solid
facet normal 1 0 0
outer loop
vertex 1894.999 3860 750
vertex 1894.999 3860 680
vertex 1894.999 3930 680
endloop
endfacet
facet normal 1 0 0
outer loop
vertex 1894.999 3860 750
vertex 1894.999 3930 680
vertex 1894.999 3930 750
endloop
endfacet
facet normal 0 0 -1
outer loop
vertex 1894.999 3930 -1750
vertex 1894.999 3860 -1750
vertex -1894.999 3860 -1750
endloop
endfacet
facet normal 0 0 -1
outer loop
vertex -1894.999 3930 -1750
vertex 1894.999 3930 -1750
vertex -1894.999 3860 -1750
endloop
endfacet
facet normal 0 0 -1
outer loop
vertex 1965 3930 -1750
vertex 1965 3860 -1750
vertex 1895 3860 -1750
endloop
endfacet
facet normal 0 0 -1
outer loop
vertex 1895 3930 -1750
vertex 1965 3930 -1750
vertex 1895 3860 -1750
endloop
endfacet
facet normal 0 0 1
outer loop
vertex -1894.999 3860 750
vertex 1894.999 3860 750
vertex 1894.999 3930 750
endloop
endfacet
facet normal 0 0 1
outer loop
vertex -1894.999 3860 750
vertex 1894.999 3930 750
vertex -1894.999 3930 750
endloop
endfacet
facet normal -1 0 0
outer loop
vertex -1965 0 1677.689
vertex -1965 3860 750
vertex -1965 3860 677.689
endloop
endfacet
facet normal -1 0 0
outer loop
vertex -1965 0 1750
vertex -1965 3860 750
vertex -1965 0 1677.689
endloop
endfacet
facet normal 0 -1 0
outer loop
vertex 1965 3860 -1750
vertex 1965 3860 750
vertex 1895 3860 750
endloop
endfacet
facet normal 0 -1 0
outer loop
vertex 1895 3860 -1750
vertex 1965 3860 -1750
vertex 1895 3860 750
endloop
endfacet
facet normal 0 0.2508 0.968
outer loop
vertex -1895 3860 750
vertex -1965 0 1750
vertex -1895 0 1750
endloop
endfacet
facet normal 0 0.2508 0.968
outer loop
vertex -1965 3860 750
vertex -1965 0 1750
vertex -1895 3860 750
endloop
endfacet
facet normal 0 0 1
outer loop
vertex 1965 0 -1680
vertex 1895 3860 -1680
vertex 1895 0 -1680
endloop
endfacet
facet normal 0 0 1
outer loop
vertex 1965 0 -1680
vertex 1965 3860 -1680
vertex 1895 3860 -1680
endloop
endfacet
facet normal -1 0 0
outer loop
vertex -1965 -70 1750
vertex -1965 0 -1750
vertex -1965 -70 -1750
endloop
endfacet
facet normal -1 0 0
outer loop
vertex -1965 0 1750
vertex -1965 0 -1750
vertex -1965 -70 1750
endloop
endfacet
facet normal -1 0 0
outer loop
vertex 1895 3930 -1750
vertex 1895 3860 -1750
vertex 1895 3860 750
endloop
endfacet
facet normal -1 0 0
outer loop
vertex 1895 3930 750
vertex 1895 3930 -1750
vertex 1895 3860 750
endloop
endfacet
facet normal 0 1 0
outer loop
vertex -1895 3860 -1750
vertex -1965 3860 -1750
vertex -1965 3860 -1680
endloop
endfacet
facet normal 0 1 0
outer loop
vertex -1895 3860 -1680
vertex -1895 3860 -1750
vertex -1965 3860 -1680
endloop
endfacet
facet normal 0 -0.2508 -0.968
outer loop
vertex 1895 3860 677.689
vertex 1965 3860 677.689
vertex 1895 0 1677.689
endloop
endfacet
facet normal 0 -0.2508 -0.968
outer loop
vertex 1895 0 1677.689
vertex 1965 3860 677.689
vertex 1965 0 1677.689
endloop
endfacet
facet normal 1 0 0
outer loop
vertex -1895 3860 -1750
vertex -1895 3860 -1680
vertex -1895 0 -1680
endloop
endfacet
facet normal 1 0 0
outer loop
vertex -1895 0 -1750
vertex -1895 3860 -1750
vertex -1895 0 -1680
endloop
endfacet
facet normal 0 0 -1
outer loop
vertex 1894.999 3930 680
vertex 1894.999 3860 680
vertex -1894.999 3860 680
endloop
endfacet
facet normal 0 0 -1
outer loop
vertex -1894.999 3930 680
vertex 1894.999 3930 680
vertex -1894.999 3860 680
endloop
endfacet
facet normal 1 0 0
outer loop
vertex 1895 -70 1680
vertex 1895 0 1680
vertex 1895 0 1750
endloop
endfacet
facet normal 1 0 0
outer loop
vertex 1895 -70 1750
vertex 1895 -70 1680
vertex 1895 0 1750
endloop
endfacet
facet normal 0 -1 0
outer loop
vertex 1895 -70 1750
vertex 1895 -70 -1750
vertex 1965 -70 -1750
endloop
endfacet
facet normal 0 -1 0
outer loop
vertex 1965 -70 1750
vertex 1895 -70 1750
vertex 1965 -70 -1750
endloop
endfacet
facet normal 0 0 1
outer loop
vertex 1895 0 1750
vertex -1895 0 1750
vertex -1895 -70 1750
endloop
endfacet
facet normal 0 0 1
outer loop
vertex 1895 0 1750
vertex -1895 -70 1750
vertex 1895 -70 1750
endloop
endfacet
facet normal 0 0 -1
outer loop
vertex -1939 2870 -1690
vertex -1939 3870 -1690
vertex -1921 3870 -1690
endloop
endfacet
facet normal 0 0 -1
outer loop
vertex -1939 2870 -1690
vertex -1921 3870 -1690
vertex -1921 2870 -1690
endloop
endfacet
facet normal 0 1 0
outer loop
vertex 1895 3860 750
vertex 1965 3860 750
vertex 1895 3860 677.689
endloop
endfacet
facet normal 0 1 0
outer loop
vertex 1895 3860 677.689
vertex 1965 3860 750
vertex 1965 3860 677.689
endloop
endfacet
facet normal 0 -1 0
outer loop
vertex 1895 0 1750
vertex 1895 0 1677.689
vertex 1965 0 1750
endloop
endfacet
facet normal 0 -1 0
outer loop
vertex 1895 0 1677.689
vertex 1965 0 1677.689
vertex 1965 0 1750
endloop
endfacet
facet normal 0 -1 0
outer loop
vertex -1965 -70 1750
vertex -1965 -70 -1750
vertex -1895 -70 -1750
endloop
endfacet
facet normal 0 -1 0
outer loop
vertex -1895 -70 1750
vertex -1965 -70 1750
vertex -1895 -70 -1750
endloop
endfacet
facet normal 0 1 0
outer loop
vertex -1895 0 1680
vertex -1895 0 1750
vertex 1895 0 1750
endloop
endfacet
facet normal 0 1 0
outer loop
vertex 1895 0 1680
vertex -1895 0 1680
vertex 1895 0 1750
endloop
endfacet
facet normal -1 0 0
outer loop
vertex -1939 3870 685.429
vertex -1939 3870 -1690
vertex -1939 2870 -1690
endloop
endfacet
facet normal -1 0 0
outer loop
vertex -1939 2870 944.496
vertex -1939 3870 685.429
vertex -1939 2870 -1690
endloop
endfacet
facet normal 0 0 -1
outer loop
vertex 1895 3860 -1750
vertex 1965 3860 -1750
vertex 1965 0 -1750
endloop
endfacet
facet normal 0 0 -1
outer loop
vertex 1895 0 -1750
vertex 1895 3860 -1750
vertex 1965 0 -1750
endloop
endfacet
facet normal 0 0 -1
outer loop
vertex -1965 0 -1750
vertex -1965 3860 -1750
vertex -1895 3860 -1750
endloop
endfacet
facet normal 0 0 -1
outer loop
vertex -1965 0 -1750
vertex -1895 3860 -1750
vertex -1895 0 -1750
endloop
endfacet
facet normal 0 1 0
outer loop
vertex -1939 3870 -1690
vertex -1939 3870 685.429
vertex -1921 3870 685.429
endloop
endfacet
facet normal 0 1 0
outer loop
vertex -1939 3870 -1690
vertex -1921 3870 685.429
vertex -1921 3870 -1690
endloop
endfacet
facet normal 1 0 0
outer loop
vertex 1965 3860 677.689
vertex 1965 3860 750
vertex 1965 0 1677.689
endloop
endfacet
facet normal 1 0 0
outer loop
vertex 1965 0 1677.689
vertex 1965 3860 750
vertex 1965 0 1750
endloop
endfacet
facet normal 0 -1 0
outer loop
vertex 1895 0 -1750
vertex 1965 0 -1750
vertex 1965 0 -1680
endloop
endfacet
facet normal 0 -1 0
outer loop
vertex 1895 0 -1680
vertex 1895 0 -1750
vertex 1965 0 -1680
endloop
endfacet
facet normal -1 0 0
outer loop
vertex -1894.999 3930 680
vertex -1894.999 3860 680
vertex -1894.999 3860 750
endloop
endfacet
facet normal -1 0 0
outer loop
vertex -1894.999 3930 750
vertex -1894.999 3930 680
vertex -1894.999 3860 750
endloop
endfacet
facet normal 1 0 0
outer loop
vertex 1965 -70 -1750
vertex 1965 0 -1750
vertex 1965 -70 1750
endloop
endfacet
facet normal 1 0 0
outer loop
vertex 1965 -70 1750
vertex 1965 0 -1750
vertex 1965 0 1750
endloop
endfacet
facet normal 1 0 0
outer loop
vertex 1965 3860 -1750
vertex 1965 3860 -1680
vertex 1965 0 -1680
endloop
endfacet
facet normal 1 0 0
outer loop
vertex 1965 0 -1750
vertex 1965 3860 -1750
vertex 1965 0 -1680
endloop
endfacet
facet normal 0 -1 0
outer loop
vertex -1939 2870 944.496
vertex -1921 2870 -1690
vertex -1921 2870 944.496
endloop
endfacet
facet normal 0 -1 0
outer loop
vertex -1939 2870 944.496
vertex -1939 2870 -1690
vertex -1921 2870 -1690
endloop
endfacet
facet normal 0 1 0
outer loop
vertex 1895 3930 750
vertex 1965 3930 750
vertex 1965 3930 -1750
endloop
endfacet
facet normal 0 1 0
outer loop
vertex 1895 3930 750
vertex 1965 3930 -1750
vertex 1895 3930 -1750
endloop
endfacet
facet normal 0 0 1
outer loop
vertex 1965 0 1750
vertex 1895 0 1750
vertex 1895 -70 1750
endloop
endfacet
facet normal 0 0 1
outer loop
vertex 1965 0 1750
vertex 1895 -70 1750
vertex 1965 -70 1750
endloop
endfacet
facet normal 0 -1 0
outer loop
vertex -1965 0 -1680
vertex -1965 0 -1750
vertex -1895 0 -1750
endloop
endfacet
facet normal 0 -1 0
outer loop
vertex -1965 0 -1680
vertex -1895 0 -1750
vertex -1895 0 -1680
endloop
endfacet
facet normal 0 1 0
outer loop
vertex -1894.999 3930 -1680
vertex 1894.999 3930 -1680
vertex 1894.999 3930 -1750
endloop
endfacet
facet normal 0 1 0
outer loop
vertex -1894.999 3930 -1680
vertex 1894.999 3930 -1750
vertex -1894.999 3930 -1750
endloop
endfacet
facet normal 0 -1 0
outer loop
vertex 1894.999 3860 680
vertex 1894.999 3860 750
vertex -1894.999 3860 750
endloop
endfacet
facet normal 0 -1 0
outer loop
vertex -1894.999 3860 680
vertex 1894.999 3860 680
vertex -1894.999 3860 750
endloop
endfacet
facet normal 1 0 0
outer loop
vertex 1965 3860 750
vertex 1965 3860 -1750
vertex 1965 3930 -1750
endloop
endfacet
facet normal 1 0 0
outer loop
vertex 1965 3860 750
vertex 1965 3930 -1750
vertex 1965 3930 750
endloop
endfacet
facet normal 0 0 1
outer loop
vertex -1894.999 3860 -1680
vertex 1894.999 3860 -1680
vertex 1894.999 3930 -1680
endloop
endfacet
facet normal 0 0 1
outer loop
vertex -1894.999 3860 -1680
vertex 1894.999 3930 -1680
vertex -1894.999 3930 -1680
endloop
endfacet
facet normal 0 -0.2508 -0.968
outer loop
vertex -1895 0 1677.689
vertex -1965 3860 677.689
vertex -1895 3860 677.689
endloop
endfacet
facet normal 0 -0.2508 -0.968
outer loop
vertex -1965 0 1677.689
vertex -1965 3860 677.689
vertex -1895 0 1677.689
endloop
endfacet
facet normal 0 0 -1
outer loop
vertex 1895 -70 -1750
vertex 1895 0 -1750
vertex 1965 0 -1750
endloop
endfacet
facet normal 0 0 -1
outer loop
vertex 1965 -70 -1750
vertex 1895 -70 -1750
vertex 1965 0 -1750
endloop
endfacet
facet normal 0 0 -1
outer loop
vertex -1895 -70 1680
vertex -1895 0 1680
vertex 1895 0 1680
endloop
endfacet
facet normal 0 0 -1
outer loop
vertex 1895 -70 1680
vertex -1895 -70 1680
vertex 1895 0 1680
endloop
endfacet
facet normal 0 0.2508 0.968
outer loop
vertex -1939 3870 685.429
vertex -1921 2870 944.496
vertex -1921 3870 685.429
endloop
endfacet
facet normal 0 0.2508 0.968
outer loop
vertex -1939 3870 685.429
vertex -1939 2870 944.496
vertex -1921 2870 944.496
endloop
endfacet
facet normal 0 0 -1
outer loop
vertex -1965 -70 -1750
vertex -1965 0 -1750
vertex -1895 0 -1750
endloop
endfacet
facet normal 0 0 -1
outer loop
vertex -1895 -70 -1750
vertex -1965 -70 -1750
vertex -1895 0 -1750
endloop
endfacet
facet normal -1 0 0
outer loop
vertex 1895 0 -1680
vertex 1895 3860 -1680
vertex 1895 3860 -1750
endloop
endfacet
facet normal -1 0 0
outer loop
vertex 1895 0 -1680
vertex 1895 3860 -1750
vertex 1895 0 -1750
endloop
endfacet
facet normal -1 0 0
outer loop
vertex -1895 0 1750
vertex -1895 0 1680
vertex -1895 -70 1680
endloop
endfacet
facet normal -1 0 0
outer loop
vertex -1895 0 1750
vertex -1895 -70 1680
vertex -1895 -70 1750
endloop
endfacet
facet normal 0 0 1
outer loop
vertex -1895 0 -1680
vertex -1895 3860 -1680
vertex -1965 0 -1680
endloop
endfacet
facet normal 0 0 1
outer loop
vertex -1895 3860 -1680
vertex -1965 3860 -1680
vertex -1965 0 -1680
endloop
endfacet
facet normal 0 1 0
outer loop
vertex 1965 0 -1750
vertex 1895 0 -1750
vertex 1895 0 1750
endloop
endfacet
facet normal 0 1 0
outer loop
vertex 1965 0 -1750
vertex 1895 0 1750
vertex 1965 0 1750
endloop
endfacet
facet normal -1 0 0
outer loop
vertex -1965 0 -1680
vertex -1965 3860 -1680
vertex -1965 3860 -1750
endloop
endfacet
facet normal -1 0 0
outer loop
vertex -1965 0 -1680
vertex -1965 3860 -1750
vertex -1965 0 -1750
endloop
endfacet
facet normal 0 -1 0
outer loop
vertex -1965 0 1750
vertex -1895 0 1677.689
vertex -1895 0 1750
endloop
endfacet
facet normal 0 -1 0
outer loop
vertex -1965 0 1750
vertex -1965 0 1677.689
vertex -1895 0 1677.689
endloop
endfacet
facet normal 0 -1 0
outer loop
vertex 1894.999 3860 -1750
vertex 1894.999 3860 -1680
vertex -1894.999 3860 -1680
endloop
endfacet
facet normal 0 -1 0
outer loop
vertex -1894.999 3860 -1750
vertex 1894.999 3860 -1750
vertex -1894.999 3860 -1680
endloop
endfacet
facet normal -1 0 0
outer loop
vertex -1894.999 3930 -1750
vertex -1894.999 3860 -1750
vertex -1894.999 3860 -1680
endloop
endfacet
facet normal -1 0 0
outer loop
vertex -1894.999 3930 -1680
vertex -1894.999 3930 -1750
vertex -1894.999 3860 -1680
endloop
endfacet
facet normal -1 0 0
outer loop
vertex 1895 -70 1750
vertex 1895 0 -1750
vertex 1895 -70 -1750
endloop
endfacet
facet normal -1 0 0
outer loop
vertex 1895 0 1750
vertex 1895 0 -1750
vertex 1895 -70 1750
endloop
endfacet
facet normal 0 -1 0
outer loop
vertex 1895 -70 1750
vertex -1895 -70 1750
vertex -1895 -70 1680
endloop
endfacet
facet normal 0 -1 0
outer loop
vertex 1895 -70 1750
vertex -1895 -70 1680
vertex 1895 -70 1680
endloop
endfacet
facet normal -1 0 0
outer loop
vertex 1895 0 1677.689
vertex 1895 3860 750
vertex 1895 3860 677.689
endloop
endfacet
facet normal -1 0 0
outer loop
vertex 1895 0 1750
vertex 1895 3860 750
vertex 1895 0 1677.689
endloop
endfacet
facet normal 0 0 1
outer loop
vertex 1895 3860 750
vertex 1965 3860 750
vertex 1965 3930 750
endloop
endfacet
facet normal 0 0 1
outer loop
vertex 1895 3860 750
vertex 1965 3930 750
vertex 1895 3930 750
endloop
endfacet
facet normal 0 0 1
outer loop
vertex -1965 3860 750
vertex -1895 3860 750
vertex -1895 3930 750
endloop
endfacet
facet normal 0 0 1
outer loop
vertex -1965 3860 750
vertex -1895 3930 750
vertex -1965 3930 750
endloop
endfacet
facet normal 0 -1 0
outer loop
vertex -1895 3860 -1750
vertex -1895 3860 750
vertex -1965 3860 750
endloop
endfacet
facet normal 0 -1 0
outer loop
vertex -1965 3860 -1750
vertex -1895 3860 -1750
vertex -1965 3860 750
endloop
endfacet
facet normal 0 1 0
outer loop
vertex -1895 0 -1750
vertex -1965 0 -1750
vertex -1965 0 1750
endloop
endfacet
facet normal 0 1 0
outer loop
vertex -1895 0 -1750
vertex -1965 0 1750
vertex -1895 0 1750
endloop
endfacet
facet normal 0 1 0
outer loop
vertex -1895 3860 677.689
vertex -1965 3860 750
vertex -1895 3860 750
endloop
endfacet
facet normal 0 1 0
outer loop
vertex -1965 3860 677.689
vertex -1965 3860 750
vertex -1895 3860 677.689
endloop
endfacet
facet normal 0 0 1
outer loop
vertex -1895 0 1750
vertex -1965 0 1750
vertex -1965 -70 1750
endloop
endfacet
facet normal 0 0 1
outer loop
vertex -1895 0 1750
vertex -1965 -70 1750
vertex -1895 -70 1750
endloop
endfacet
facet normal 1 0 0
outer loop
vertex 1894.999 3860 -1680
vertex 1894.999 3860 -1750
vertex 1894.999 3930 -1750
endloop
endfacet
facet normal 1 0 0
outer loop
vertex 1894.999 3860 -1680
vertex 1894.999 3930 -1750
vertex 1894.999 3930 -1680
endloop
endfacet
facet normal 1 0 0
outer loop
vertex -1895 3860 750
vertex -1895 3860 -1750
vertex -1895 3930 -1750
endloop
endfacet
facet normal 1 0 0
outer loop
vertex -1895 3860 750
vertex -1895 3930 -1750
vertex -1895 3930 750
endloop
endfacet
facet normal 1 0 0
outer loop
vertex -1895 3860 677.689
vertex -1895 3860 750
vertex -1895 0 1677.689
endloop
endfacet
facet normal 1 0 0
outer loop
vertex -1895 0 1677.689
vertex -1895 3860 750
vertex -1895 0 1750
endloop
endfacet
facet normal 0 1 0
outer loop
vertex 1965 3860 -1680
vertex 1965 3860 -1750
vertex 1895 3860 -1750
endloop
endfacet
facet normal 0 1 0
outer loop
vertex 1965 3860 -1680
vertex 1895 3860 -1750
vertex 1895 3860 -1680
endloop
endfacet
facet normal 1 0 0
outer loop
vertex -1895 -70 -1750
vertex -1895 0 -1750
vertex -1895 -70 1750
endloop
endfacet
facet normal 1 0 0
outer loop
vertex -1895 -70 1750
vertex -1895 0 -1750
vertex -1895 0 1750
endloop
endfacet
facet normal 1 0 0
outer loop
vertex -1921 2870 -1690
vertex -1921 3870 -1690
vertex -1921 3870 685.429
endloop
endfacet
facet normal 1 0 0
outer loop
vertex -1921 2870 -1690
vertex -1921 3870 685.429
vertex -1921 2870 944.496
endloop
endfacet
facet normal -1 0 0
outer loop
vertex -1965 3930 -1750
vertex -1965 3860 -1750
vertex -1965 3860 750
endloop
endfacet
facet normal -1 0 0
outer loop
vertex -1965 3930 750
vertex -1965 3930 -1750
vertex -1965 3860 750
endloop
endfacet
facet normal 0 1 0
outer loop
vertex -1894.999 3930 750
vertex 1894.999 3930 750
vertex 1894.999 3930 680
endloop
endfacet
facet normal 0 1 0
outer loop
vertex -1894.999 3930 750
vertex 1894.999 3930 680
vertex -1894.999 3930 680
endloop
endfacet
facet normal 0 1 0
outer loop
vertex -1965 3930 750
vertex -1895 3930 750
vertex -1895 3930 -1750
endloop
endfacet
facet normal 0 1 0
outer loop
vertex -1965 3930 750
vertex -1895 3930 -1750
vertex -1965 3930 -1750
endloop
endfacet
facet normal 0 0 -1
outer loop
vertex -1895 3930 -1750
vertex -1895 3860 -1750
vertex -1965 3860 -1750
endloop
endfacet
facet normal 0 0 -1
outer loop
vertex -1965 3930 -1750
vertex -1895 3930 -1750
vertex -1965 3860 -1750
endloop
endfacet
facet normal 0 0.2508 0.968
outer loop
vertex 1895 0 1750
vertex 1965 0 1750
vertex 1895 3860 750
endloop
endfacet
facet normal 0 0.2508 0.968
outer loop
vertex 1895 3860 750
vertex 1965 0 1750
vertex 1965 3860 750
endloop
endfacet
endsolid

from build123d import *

# Parameters (mm, degrees)
F2_W          = 70
F2_H          = 3500
F3_DEPTH      = 70
F4_W          = 3790
F4_H          = 70
F5_DEPTH      = 70
F9_DEPTH      = 35
F9_DEPTH_BACK = 35
F8_W          = 3860
F8_H          = 70
F11_W         = 70
F11_H         = 2500
F12_DEPTH     = 70
F11_W_2       = 3789.998
F11_H_2       = 70
F14_DEPTH     = 9


with BuildPart() as f3:
    # F2 (on Front) → F3 (new body)
    with BuildSketch(Plane.XZ):
        with Locations((-1930, 0)):
            Rectangle(F2_W, F2_H)
    extrude(amount=F3_DEPTH)


with BuildPart() as f3b:
    # F2 (on Front) → F3, piece 2 (new body)
    with BuildSketch(Plane.XZ):
        with Locations((1930, 0)):
            Rectangle(F2_W, F2_H)
    extrude(amount=F3_DEPTH)


with BuildPart() as f5:
    # F4 (on face) → F5 (new body)
    with BuildSketch(Plane.XZ):
        with Locations((0, 1715)):
            Rectangle(F4_W, F4_H)
    extrude(amount=F5_DEPTH)


with BuildPart() as f9:
    # F8 (on offset) → F9 (new body, two sides)
    with BuildSketch(Plane(origin=(-1930, 0, 0), x_dir=(0, -1, 0), z_dir=(-1, 0, 0))) as f9_sk:
        Polygon((0, 1677.6890887274), (0, 1750), (-3860, 750), (-3860, 677.6890887274), align=None)
    extrude(amount=F9_DEPTH)
    extrude(f9_sk.sketch, amount=-F9_DEPTH_BACK)


with BuildPart() as f9b:
    # F8 (on offset) → F9, piece 2 (new body, two sides)
    with BuildSketch(Plane(origin=(-1930, 0, 0), x_dir=(0, -1, 0), z_dir=(-1, 0, 0))) as f9_2_sk:
        with Locations((-1930, -1715)):
            Rectangle(F8_W, F8_H)
    extrude(amount=F9_DEPTH)
    extrude(f9_2_sk.sketch, amount=-F9_DEPTH_BACK)


with BuildPart() as f10_1:
    # F10: instance of F9
    add(f9.part.mirror(Plane.YZ))


with BuildPart() as f10_2:
    # F10: instance of F9b
    add(f9b.part.mirror(Plane.YZ))


with BuildPart() as f12:
    # F11 (on face) → F12 (new body)
    with BuildSketch(Plane(origin=(0, 3860, 0), x_dir=(-1, 0, 0), z_dir=(0, 1, 0))):
        with Locations((-1930, -500)):
            Rectangle(F11_W, F11_H)
    extrude(amount=F12_DEPTH)


with BuildPart() as f12b:
    # F11 (on face) → F12, piece 2 (new body)
    with BuildSketch(Plane(origin=(0, 3860, 0), x_dir=(-1, 0, 0), z_dir=(0, 1, 0))):
        with Locations((1930, -500)):
            Rectangle(F11_W, F11_H)
    extrude(amount=F12_DEPTH)


with BuildPart() as f12c:
    # F11 (on face) → F12, piece 3 (new body)
    with BuildSketch(Plane(origin=(0, 3860, 0), x_dir=(-1, 0, 0), z_dir=(0, 1, 0))):
        with Locations((0, 715)):
            Rectangle(F11_W_2, F11_H_2)
    extrude(amount=F12_DEPTH)


with BuildPart() as f12d:
    # F11 (on face) → F12, piece 4 (new body)
    with BuildSketch(Plane(origin=(0, 3860, 0), x_dir=(-1, 0, 0), z_dir=(0, 1, 0))):
        with Locations((0, -1715)):
            Rectangle(F11_W_2, F11_H_2)
    extrude(amount=F12_DEPTH)


with BuildPart() as f14:
    # F13 (on offset) → F14 (new body, symmetric)
    with BuildSketch(Plane(origin=(-1930, 0, 0), x_dir=(0, -1, 0), z_dir=(-1, 0, 0))):
        Polygon((-2870, 944.495902847), (-3870, 685.4285453341), (-3870, -1690), (-2870, -1690), align=None)
    extrude(amount=F14_DEPTH, both=True)


solid = Compound([f3.part, f3b.part, f5.part, f9.part, f9b.part, f10_1.part, f10_2.part, f12.part, f12b.part, f12c.part, f12d.part, f14.part])
